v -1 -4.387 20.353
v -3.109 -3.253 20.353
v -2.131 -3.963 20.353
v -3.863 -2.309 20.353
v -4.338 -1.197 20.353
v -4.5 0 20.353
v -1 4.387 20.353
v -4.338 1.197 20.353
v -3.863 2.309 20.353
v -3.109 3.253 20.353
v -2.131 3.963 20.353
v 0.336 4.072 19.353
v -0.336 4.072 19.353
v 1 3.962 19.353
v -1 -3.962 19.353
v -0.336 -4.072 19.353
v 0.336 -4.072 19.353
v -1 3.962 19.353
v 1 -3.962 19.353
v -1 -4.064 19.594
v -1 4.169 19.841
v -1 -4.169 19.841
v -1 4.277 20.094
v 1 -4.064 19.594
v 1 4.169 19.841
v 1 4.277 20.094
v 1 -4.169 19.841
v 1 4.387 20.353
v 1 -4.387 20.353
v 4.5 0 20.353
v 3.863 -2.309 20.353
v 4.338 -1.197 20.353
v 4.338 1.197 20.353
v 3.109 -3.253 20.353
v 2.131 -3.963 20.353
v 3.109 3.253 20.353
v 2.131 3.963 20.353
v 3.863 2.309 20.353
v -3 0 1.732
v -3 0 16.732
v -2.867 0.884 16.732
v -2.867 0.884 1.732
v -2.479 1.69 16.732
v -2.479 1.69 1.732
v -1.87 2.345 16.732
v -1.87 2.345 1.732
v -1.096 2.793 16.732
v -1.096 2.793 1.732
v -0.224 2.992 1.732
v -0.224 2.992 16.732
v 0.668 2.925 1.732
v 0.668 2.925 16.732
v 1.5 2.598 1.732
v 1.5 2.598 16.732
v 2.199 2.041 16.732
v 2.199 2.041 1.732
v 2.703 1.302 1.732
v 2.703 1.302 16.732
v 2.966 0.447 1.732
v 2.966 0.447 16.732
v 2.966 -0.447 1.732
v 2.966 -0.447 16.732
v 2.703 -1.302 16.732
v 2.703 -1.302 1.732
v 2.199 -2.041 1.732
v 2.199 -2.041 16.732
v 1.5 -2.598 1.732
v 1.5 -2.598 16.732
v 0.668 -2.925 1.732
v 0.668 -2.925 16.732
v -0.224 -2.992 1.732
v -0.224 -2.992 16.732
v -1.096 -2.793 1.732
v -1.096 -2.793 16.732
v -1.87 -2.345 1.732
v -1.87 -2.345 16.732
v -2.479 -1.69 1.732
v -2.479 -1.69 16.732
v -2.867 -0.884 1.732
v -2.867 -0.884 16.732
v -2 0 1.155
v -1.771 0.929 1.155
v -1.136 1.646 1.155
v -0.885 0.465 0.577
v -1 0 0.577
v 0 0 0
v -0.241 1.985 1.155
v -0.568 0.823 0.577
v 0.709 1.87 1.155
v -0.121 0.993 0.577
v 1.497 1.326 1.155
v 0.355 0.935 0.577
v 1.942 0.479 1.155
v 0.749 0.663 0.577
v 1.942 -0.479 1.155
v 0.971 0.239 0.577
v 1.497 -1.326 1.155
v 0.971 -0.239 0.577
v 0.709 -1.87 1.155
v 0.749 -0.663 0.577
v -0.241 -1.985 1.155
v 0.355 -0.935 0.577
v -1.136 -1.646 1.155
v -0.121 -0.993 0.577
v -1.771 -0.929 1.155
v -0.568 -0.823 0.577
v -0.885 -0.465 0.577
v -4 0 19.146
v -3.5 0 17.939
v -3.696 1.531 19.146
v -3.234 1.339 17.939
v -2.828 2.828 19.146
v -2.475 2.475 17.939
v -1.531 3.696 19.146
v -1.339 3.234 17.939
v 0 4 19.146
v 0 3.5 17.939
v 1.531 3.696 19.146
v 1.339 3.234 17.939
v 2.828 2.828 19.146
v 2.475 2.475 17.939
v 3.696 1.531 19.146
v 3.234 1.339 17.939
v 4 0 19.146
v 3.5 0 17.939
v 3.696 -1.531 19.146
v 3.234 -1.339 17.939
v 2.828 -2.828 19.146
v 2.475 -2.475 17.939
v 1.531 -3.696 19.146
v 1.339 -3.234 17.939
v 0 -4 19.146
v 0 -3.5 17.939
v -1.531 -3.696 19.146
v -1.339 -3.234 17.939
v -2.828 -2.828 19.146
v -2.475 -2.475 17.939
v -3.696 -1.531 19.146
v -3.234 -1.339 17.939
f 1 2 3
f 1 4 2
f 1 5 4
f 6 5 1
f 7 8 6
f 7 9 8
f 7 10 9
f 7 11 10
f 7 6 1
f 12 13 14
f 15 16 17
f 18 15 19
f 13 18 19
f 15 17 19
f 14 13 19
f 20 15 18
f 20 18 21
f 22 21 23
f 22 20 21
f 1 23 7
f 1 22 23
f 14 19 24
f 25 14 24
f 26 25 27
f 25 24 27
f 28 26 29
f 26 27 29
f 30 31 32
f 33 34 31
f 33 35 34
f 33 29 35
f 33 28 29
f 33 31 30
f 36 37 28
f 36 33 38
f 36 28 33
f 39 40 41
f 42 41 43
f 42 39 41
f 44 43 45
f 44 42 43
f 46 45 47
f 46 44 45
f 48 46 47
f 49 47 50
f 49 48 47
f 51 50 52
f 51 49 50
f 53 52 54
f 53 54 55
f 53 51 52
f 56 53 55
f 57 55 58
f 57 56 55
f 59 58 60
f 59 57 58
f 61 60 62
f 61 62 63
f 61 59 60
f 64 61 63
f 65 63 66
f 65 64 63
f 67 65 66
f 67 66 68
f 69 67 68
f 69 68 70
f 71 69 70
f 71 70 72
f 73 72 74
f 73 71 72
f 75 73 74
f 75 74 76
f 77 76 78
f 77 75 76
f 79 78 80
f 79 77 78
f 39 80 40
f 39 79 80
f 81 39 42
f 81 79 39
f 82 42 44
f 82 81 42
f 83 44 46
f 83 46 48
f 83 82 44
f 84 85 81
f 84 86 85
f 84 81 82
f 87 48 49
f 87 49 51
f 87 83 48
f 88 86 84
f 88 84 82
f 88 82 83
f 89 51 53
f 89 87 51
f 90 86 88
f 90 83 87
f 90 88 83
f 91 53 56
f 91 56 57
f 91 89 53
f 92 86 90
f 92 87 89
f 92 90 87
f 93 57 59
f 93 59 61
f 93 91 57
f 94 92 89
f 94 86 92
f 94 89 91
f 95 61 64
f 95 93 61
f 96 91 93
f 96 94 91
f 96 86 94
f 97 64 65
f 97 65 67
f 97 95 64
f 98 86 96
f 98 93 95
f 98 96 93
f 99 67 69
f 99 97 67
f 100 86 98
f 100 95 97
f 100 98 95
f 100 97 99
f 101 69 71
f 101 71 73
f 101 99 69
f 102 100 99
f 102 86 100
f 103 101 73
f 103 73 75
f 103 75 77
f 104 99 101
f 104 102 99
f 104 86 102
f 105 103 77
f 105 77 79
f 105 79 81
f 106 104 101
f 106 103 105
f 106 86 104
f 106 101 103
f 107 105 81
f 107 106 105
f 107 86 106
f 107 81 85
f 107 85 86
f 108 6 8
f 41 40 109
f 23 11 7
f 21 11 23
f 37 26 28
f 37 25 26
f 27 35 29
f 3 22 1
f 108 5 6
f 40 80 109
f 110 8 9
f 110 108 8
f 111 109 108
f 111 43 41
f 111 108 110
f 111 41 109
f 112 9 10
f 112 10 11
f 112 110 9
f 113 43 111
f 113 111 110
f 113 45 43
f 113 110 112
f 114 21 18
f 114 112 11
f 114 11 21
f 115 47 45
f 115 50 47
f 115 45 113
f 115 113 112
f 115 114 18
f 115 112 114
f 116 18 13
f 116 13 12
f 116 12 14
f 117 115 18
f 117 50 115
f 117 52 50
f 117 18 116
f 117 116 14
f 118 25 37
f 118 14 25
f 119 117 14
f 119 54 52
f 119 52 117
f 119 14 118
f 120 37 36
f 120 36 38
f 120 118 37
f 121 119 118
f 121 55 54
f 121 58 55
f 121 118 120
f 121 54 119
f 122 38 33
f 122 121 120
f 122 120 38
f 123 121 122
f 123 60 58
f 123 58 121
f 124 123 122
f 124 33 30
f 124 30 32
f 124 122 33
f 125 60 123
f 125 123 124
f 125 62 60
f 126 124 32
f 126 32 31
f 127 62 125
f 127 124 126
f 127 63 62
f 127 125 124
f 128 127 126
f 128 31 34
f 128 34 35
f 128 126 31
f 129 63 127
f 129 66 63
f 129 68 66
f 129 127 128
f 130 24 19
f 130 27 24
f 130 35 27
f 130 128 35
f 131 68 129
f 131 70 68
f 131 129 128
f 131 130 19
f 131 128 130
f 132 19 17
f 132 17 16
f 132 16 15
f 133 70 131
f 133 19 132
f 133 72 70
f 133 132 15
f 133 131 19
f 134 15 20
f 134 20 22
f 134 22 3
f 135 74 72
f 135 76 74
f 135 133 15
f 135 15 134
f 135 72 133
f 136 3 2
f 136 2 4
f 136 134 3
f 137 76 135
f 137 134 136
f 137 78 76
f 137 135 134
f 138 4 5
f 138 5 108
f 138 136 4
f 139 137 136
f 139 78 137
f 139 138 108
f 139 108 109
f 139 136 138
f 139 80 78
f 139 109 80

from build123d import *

# Parameters (mm, degrees)
F2_W     = 2
F2_H     = 1
F3_DEPTH = 5


with BuildPart() as f1:
    # F0 (on Front) → F1 (revolve)
    with BuildSketch(Plane.XZ):
        Polygon((-3, 1.732051), (0, 0), (0, 20.353371), (-4.5, 20.353371), (-3, 16.732051), align=None)
    revolve(axis=Axis((0, 0, 10.176686), (0, 0, -1)))

    # F2 (on Front) → F3 (cut, symmetric)
    with BuildSketch(Plane.XZ):
        with Locations((0, 19.853371)):
            Rectangle(F2_W, F2_H)
    extrude(amount=F3_DEPTH, both=True, mode=Mode.SUBTRACT)


solid = f1.part
